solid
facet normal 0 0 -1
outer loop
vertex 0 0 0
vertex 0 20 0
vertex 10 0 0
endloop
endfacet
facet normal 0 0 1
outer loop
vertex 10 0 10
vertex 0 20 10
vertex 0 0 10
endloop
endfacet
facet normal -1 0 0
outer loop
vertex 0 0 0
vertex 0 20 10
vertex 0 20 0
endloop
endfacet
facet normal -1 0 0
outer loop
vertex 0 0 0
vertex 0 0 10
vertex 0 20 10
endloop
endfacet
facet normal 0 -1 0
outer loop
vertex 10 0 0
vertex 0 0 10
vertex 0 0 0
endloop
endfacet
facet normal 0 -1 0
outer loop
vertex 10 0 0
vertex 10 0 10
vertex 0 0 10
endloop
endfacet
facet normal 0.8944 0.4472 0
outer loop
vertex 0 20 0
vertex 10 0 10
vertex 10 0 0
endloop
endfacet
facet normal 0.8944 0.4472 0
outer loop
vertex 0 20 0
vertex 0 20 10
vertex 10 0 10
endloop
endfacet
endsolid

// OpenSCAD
/*
 * Creates a prism
 */
module prism(v,h){
  linear_extrude(height=h,slices=1)
  polygon(v);
}

prism([[0,0],[10,0],[0,20]],10);
